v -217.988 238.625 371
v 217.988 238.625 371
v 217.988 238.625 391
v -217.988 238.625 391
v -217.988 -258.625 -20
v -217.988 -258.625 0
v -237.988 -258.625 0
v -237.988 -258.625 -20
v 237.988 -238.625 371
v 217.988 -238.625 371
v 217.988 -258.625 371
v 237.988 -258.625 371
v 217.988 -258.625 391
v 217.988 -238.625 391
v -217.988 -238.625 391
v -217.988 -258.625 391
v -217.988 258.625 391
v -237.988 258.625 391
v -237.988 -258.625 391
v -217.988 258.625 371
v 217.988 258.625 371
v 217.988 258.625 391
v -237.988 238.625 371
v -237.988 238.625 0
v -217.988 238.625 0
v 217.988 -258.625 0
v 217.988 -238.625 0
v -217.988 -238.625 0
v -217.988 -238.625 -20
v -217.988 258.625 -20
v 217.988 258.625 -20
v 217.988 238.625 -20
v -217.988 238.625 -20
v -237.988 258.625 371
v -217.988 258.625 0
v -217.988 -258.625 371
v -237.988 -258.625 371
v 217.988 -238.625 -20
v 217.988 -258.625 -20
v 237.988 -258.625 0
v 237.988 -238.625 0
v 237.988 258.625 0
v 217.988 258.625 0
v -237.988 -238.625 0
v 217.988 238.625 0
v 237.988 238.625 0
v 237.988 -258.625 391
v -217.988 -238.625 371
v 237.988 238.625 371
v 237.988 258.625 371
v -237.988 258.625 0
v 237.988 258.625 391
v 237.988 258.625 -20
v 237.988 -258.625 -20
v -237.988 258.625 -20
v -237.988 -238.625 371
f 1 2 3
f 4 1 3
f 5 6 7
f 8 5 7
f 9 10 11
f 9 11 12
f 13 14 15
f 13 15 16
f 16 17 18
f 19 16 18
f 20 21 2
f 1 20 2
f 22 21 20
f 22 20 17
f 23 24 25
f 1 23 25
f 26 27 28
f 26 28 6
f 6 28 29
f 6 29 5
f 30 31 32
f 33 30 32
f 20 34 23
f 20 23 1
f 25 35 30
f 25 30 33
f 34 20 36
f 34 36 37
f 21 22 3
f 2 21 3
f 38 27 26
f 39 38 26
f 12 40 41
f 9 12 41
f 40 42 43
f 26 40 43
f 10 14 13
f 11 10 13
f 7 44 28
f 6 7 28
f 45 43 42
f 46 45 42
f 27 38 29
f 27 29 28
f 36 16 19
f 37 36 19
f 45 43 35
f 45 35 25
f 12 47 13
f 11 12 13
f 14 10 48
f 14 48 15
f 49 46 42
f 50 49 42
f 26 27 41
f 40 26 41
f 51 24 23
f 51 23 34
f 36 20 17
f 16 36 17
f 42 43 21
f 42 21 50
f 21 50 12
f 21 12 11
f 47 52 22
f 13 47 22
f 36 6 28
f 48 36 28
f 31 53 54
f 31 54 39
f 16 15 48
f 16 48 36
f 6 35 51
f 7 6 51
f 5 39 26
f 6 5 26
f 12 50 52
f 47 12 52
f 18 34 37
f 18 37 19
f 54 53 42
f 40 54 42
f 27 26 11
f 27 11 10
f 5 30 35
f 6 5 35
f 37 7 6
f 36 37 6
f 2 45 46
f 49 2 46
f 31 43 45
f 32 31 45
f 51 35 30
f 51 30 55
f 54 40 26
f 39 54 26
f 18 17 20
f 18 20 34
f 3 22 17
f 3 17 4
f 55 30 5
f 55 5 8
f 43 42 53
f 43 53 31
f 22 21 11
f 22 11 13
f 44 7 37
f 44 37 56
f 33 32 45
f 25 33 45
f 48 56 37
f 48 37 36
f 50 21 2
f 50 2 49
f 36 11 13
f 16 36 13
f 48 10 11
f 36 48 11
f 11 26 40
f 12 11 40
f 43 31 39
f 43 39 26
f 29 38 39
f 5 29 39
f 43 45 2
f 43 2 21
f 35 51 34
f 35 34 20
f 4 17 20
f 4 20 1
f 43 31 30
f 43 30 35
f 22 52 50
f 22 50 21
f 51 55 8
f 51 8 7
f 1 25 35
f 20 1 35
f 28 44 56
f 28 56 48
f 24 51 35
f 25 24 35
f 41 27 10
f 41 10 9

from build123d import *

# Parameters (mm, degrees)
F0_W     = 20
F0_H     = 20
F1_DEPTH = 371
F2_W     = 20
F2_H     = 20
F3_DEPTH = 435.975
F4_W     = 20
F4_H     = 20
F5_DEPTH = 517.25


with BuildPart() as f1:
    # F0 (on Top) → F1 (new body)
    with BuildSketch(Plane.XY):
        with Locations((227.9875, 248.625)):
            Rectangle(F0_W, F0_H)
    extrude(amount=F1_DEPTH)


with BuildPart() as f1b:
    # F0 (on Top) → F1, piece 2 (new body)
    with BuildSketch(Plane.XY):
        with Locations((-227.9875, 248.625)):
            Rectangle(F0_W, F0_H)
    extrude(amount=F1_DEPTH)


with BuildPart() as f1c:
    # F0 (on Top) → F1, piece 3 (new body)
    with BuildSketch(Plane.XY):
        with Locations((-227.9875, -248.625)):
            Rectangle(F0_W, F0_H)
    extrude(amount=F1_DEPTH)


with BuildPart() as f1d:
    # F0 (on Top) → F1, piece 4 (new body)
    with BuildSketch(Plane.XY):
        with Locations((227.9875, -248.625)):
            Rectangle(F0_W, F0_H)
    extrude(amount=F1_DEPTH)


with BuildPart() as f3:
    # F2 (on face) → F3 (new body, through all)
    with BuildSketch(Plane(origin=(217.9875, 0, 0), x_dir=(0, -1, 0), z_dir=(-1, 0, 0))):
        with Locations((-248.625, 381)):
            Rectangle(F2_W, F2_H)
    extrude(amount=F3_DEPTH)


with BuildPart() as f3b:
    # F2 (on face) → F3, piece 2 (new body, through all)
    with BuildSketch(Plane(origin=(217.9875, 0, 0), x_dir=(0, -1, 0), z_dir=(-1, 0, 0))):
        with Locations((248.625, 381)):
            Rectangle(F2_W, F2_H)
    extrude(amount=F3_DEPTH)


with BuildPart() as f3c:
    # F2 (on face) → F3, piece 3 (new body, through all)
    with BuildSketch(Plane(origin=(217.9875, 0, 0), x_dir=(0, -1, 0), z_dir=(-1, 0, 0))):
        with Locations((-248.625, -10)):
            Rectangle(F2_W, F2_H)
    extrude(amount=F3_DEPTH)


with BuildPart() as f3d:
    # F2 (on face) → F3, piece 4 (new body, through all)
    with BuildSketch(Plane(origin=(217.9875, 0, 0), x_dir=(0, -1, 0), z_dir=(-1, 0, 0))):
        with Locations((248.625, -10)):
            Rectangle(F2_W, F2_H)
    extrude(amount=F3_DEPTH)


with BuildPart() as f5:
    # F4 (on face) → F5 (new body, through all)
    with BuildSketch(Plane(origin=(0, 258.625, 0), x_dir=(-1, 0, 0), z_dir=(0, 1, 0))):
        with Locations((-227.9875, -10)):
            Rectangle(F4_W, F4_H)
    extrude(amount=-F5_DEPTH)


with BuildPart() as f5b:
    # F4 (on face) → F5, piece 2 (new body, through all)
    with BuildSketch(Plane(origin=(0, 258.625, 0), x_dir=(-1, 0, 0), z_dir=(0, 1, 0))):
        with Locations((227.9875, -10)):
            Rectangle(F4_W, F4_H)
    extrude(amount=-F5_DEPTH)


with BuildPart() as f5c:
    # F4 (on face) → F5, piece 3 (new body, through all)
    with BuildSketch(Plane(origin=(0, 258.625, 0), x_dir=(-1, 0, 0), z_dir=(0, 1, 0))):
        with Locations((227.9875, 381)):
            Rectangle(F4_W, F4_H)
    extrude(amount=-F5_DEPTH)


with BuildPart() as f5d:
    # F4 (on face) → F5, piece 4 (new body, through all)
    with BuildSketch(Plane(origin=(0, 258.625, 0), x_dir=(-1, 0, 0), z_dir=(0, 1, 0))):
        with Locations((-227.9875, 381)):
            Rectangle(F4_W, F4_H)
    extrude(amount=-F5_DEPTH)


solid = Compound([f1.part, f1b.part, f1c.part, f1d.part, f3.part, f3b.part, f3c.part, f3d.part, f5.part, f5b.part, f5c.part, f5d.part])
